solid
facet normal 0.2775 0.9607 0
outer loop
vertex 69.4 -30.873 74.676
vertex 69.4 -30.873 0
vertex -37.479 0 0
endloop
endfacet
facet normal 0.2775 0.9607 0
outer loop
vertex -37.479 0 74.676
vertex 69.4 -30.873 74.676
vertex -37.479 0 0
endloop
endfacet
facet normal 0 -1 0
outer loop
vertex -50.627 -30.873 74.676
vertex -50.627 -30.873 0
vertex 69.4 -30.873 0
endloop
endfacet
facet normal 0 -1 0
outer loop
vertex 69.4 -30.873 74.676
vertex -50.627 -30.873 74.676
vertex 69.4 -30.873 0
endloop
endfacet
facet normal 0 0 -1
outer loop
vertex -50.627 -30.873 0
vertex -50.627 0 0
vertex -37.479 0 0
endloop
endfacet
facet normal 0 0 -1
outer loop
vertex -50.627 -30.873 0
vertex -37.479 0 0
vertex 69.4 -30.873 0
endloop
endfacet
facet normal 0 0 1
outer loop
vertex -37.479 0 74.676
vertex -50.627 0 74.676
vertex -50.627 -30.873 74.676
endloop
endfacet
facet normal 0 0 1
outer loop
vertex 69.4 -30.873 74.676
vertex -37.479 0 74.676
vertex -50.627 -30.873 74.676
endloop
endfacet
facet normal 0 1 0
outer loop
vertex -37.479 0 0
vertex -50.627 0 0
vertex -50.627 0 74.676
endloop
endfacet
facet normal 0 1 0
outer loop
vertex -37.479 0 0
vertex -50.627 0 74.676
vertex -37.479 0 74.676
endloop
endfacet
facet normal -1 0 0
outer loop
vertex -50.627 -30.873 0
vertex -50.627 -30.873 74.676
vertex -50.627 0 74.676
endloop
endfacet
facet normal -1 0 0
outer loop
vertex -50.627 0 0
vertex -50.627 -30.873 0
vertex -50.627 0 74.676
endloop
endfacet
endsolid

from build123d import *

# Parameters (mm, degrees)
F1_DEPTH = 74.676
F2_W     = 65.046132
F2_H     = 38.793292
F3_DEPTH = 123.19
F4_W     = 75.36434
F4_H     = 42.812191
F5_DEPTH = 78.74
F6_W     = 15.368398
F6_H     = 37.422214
F7_DEPTH = 116.84


with BuildPart() as f1:
    # F0 (on Top) → F1 (new body)
    with BuildSketch(Plane.XY):
        Polygon((-37.479065, 17.799251), (-62.800989, 17.799251), (-62.800989, -30.872758), (69.400154, -30.872758), (-37.479065, 0), align=None)
    extrude(amount=F1_DEPTH)

    # F2 (on Top) → F3 (cut)
    with BuildSketch(Plane.XY):
        with Locations((-32.523066, 19.396646)):
            Rectangle(F2_W, F2_H)
    extrude(amount=F3_DEPTH, mode=Mode.SUBTRACT)

    # F4 (on Top) → F5 (cut)
    with BuildSketch(Plane.XY):
        with Locations((-96.438488, -21.406095)):
            Rectangle(F4_W, F4_H)
    extrude(amount=F5_DEPTH, mode=Mode.SUBTRACT)

    # F6 (on Top) → F7 (cut)
    with BuildSketch(Plane.XY):
        with Locations((-58.310846, -18.711107)):
            Rectangle(F6_W, F6_H)
    extrude(amount=F7_DEPTH, mode=Mode.SUBTRACT)


solid = f1.part
